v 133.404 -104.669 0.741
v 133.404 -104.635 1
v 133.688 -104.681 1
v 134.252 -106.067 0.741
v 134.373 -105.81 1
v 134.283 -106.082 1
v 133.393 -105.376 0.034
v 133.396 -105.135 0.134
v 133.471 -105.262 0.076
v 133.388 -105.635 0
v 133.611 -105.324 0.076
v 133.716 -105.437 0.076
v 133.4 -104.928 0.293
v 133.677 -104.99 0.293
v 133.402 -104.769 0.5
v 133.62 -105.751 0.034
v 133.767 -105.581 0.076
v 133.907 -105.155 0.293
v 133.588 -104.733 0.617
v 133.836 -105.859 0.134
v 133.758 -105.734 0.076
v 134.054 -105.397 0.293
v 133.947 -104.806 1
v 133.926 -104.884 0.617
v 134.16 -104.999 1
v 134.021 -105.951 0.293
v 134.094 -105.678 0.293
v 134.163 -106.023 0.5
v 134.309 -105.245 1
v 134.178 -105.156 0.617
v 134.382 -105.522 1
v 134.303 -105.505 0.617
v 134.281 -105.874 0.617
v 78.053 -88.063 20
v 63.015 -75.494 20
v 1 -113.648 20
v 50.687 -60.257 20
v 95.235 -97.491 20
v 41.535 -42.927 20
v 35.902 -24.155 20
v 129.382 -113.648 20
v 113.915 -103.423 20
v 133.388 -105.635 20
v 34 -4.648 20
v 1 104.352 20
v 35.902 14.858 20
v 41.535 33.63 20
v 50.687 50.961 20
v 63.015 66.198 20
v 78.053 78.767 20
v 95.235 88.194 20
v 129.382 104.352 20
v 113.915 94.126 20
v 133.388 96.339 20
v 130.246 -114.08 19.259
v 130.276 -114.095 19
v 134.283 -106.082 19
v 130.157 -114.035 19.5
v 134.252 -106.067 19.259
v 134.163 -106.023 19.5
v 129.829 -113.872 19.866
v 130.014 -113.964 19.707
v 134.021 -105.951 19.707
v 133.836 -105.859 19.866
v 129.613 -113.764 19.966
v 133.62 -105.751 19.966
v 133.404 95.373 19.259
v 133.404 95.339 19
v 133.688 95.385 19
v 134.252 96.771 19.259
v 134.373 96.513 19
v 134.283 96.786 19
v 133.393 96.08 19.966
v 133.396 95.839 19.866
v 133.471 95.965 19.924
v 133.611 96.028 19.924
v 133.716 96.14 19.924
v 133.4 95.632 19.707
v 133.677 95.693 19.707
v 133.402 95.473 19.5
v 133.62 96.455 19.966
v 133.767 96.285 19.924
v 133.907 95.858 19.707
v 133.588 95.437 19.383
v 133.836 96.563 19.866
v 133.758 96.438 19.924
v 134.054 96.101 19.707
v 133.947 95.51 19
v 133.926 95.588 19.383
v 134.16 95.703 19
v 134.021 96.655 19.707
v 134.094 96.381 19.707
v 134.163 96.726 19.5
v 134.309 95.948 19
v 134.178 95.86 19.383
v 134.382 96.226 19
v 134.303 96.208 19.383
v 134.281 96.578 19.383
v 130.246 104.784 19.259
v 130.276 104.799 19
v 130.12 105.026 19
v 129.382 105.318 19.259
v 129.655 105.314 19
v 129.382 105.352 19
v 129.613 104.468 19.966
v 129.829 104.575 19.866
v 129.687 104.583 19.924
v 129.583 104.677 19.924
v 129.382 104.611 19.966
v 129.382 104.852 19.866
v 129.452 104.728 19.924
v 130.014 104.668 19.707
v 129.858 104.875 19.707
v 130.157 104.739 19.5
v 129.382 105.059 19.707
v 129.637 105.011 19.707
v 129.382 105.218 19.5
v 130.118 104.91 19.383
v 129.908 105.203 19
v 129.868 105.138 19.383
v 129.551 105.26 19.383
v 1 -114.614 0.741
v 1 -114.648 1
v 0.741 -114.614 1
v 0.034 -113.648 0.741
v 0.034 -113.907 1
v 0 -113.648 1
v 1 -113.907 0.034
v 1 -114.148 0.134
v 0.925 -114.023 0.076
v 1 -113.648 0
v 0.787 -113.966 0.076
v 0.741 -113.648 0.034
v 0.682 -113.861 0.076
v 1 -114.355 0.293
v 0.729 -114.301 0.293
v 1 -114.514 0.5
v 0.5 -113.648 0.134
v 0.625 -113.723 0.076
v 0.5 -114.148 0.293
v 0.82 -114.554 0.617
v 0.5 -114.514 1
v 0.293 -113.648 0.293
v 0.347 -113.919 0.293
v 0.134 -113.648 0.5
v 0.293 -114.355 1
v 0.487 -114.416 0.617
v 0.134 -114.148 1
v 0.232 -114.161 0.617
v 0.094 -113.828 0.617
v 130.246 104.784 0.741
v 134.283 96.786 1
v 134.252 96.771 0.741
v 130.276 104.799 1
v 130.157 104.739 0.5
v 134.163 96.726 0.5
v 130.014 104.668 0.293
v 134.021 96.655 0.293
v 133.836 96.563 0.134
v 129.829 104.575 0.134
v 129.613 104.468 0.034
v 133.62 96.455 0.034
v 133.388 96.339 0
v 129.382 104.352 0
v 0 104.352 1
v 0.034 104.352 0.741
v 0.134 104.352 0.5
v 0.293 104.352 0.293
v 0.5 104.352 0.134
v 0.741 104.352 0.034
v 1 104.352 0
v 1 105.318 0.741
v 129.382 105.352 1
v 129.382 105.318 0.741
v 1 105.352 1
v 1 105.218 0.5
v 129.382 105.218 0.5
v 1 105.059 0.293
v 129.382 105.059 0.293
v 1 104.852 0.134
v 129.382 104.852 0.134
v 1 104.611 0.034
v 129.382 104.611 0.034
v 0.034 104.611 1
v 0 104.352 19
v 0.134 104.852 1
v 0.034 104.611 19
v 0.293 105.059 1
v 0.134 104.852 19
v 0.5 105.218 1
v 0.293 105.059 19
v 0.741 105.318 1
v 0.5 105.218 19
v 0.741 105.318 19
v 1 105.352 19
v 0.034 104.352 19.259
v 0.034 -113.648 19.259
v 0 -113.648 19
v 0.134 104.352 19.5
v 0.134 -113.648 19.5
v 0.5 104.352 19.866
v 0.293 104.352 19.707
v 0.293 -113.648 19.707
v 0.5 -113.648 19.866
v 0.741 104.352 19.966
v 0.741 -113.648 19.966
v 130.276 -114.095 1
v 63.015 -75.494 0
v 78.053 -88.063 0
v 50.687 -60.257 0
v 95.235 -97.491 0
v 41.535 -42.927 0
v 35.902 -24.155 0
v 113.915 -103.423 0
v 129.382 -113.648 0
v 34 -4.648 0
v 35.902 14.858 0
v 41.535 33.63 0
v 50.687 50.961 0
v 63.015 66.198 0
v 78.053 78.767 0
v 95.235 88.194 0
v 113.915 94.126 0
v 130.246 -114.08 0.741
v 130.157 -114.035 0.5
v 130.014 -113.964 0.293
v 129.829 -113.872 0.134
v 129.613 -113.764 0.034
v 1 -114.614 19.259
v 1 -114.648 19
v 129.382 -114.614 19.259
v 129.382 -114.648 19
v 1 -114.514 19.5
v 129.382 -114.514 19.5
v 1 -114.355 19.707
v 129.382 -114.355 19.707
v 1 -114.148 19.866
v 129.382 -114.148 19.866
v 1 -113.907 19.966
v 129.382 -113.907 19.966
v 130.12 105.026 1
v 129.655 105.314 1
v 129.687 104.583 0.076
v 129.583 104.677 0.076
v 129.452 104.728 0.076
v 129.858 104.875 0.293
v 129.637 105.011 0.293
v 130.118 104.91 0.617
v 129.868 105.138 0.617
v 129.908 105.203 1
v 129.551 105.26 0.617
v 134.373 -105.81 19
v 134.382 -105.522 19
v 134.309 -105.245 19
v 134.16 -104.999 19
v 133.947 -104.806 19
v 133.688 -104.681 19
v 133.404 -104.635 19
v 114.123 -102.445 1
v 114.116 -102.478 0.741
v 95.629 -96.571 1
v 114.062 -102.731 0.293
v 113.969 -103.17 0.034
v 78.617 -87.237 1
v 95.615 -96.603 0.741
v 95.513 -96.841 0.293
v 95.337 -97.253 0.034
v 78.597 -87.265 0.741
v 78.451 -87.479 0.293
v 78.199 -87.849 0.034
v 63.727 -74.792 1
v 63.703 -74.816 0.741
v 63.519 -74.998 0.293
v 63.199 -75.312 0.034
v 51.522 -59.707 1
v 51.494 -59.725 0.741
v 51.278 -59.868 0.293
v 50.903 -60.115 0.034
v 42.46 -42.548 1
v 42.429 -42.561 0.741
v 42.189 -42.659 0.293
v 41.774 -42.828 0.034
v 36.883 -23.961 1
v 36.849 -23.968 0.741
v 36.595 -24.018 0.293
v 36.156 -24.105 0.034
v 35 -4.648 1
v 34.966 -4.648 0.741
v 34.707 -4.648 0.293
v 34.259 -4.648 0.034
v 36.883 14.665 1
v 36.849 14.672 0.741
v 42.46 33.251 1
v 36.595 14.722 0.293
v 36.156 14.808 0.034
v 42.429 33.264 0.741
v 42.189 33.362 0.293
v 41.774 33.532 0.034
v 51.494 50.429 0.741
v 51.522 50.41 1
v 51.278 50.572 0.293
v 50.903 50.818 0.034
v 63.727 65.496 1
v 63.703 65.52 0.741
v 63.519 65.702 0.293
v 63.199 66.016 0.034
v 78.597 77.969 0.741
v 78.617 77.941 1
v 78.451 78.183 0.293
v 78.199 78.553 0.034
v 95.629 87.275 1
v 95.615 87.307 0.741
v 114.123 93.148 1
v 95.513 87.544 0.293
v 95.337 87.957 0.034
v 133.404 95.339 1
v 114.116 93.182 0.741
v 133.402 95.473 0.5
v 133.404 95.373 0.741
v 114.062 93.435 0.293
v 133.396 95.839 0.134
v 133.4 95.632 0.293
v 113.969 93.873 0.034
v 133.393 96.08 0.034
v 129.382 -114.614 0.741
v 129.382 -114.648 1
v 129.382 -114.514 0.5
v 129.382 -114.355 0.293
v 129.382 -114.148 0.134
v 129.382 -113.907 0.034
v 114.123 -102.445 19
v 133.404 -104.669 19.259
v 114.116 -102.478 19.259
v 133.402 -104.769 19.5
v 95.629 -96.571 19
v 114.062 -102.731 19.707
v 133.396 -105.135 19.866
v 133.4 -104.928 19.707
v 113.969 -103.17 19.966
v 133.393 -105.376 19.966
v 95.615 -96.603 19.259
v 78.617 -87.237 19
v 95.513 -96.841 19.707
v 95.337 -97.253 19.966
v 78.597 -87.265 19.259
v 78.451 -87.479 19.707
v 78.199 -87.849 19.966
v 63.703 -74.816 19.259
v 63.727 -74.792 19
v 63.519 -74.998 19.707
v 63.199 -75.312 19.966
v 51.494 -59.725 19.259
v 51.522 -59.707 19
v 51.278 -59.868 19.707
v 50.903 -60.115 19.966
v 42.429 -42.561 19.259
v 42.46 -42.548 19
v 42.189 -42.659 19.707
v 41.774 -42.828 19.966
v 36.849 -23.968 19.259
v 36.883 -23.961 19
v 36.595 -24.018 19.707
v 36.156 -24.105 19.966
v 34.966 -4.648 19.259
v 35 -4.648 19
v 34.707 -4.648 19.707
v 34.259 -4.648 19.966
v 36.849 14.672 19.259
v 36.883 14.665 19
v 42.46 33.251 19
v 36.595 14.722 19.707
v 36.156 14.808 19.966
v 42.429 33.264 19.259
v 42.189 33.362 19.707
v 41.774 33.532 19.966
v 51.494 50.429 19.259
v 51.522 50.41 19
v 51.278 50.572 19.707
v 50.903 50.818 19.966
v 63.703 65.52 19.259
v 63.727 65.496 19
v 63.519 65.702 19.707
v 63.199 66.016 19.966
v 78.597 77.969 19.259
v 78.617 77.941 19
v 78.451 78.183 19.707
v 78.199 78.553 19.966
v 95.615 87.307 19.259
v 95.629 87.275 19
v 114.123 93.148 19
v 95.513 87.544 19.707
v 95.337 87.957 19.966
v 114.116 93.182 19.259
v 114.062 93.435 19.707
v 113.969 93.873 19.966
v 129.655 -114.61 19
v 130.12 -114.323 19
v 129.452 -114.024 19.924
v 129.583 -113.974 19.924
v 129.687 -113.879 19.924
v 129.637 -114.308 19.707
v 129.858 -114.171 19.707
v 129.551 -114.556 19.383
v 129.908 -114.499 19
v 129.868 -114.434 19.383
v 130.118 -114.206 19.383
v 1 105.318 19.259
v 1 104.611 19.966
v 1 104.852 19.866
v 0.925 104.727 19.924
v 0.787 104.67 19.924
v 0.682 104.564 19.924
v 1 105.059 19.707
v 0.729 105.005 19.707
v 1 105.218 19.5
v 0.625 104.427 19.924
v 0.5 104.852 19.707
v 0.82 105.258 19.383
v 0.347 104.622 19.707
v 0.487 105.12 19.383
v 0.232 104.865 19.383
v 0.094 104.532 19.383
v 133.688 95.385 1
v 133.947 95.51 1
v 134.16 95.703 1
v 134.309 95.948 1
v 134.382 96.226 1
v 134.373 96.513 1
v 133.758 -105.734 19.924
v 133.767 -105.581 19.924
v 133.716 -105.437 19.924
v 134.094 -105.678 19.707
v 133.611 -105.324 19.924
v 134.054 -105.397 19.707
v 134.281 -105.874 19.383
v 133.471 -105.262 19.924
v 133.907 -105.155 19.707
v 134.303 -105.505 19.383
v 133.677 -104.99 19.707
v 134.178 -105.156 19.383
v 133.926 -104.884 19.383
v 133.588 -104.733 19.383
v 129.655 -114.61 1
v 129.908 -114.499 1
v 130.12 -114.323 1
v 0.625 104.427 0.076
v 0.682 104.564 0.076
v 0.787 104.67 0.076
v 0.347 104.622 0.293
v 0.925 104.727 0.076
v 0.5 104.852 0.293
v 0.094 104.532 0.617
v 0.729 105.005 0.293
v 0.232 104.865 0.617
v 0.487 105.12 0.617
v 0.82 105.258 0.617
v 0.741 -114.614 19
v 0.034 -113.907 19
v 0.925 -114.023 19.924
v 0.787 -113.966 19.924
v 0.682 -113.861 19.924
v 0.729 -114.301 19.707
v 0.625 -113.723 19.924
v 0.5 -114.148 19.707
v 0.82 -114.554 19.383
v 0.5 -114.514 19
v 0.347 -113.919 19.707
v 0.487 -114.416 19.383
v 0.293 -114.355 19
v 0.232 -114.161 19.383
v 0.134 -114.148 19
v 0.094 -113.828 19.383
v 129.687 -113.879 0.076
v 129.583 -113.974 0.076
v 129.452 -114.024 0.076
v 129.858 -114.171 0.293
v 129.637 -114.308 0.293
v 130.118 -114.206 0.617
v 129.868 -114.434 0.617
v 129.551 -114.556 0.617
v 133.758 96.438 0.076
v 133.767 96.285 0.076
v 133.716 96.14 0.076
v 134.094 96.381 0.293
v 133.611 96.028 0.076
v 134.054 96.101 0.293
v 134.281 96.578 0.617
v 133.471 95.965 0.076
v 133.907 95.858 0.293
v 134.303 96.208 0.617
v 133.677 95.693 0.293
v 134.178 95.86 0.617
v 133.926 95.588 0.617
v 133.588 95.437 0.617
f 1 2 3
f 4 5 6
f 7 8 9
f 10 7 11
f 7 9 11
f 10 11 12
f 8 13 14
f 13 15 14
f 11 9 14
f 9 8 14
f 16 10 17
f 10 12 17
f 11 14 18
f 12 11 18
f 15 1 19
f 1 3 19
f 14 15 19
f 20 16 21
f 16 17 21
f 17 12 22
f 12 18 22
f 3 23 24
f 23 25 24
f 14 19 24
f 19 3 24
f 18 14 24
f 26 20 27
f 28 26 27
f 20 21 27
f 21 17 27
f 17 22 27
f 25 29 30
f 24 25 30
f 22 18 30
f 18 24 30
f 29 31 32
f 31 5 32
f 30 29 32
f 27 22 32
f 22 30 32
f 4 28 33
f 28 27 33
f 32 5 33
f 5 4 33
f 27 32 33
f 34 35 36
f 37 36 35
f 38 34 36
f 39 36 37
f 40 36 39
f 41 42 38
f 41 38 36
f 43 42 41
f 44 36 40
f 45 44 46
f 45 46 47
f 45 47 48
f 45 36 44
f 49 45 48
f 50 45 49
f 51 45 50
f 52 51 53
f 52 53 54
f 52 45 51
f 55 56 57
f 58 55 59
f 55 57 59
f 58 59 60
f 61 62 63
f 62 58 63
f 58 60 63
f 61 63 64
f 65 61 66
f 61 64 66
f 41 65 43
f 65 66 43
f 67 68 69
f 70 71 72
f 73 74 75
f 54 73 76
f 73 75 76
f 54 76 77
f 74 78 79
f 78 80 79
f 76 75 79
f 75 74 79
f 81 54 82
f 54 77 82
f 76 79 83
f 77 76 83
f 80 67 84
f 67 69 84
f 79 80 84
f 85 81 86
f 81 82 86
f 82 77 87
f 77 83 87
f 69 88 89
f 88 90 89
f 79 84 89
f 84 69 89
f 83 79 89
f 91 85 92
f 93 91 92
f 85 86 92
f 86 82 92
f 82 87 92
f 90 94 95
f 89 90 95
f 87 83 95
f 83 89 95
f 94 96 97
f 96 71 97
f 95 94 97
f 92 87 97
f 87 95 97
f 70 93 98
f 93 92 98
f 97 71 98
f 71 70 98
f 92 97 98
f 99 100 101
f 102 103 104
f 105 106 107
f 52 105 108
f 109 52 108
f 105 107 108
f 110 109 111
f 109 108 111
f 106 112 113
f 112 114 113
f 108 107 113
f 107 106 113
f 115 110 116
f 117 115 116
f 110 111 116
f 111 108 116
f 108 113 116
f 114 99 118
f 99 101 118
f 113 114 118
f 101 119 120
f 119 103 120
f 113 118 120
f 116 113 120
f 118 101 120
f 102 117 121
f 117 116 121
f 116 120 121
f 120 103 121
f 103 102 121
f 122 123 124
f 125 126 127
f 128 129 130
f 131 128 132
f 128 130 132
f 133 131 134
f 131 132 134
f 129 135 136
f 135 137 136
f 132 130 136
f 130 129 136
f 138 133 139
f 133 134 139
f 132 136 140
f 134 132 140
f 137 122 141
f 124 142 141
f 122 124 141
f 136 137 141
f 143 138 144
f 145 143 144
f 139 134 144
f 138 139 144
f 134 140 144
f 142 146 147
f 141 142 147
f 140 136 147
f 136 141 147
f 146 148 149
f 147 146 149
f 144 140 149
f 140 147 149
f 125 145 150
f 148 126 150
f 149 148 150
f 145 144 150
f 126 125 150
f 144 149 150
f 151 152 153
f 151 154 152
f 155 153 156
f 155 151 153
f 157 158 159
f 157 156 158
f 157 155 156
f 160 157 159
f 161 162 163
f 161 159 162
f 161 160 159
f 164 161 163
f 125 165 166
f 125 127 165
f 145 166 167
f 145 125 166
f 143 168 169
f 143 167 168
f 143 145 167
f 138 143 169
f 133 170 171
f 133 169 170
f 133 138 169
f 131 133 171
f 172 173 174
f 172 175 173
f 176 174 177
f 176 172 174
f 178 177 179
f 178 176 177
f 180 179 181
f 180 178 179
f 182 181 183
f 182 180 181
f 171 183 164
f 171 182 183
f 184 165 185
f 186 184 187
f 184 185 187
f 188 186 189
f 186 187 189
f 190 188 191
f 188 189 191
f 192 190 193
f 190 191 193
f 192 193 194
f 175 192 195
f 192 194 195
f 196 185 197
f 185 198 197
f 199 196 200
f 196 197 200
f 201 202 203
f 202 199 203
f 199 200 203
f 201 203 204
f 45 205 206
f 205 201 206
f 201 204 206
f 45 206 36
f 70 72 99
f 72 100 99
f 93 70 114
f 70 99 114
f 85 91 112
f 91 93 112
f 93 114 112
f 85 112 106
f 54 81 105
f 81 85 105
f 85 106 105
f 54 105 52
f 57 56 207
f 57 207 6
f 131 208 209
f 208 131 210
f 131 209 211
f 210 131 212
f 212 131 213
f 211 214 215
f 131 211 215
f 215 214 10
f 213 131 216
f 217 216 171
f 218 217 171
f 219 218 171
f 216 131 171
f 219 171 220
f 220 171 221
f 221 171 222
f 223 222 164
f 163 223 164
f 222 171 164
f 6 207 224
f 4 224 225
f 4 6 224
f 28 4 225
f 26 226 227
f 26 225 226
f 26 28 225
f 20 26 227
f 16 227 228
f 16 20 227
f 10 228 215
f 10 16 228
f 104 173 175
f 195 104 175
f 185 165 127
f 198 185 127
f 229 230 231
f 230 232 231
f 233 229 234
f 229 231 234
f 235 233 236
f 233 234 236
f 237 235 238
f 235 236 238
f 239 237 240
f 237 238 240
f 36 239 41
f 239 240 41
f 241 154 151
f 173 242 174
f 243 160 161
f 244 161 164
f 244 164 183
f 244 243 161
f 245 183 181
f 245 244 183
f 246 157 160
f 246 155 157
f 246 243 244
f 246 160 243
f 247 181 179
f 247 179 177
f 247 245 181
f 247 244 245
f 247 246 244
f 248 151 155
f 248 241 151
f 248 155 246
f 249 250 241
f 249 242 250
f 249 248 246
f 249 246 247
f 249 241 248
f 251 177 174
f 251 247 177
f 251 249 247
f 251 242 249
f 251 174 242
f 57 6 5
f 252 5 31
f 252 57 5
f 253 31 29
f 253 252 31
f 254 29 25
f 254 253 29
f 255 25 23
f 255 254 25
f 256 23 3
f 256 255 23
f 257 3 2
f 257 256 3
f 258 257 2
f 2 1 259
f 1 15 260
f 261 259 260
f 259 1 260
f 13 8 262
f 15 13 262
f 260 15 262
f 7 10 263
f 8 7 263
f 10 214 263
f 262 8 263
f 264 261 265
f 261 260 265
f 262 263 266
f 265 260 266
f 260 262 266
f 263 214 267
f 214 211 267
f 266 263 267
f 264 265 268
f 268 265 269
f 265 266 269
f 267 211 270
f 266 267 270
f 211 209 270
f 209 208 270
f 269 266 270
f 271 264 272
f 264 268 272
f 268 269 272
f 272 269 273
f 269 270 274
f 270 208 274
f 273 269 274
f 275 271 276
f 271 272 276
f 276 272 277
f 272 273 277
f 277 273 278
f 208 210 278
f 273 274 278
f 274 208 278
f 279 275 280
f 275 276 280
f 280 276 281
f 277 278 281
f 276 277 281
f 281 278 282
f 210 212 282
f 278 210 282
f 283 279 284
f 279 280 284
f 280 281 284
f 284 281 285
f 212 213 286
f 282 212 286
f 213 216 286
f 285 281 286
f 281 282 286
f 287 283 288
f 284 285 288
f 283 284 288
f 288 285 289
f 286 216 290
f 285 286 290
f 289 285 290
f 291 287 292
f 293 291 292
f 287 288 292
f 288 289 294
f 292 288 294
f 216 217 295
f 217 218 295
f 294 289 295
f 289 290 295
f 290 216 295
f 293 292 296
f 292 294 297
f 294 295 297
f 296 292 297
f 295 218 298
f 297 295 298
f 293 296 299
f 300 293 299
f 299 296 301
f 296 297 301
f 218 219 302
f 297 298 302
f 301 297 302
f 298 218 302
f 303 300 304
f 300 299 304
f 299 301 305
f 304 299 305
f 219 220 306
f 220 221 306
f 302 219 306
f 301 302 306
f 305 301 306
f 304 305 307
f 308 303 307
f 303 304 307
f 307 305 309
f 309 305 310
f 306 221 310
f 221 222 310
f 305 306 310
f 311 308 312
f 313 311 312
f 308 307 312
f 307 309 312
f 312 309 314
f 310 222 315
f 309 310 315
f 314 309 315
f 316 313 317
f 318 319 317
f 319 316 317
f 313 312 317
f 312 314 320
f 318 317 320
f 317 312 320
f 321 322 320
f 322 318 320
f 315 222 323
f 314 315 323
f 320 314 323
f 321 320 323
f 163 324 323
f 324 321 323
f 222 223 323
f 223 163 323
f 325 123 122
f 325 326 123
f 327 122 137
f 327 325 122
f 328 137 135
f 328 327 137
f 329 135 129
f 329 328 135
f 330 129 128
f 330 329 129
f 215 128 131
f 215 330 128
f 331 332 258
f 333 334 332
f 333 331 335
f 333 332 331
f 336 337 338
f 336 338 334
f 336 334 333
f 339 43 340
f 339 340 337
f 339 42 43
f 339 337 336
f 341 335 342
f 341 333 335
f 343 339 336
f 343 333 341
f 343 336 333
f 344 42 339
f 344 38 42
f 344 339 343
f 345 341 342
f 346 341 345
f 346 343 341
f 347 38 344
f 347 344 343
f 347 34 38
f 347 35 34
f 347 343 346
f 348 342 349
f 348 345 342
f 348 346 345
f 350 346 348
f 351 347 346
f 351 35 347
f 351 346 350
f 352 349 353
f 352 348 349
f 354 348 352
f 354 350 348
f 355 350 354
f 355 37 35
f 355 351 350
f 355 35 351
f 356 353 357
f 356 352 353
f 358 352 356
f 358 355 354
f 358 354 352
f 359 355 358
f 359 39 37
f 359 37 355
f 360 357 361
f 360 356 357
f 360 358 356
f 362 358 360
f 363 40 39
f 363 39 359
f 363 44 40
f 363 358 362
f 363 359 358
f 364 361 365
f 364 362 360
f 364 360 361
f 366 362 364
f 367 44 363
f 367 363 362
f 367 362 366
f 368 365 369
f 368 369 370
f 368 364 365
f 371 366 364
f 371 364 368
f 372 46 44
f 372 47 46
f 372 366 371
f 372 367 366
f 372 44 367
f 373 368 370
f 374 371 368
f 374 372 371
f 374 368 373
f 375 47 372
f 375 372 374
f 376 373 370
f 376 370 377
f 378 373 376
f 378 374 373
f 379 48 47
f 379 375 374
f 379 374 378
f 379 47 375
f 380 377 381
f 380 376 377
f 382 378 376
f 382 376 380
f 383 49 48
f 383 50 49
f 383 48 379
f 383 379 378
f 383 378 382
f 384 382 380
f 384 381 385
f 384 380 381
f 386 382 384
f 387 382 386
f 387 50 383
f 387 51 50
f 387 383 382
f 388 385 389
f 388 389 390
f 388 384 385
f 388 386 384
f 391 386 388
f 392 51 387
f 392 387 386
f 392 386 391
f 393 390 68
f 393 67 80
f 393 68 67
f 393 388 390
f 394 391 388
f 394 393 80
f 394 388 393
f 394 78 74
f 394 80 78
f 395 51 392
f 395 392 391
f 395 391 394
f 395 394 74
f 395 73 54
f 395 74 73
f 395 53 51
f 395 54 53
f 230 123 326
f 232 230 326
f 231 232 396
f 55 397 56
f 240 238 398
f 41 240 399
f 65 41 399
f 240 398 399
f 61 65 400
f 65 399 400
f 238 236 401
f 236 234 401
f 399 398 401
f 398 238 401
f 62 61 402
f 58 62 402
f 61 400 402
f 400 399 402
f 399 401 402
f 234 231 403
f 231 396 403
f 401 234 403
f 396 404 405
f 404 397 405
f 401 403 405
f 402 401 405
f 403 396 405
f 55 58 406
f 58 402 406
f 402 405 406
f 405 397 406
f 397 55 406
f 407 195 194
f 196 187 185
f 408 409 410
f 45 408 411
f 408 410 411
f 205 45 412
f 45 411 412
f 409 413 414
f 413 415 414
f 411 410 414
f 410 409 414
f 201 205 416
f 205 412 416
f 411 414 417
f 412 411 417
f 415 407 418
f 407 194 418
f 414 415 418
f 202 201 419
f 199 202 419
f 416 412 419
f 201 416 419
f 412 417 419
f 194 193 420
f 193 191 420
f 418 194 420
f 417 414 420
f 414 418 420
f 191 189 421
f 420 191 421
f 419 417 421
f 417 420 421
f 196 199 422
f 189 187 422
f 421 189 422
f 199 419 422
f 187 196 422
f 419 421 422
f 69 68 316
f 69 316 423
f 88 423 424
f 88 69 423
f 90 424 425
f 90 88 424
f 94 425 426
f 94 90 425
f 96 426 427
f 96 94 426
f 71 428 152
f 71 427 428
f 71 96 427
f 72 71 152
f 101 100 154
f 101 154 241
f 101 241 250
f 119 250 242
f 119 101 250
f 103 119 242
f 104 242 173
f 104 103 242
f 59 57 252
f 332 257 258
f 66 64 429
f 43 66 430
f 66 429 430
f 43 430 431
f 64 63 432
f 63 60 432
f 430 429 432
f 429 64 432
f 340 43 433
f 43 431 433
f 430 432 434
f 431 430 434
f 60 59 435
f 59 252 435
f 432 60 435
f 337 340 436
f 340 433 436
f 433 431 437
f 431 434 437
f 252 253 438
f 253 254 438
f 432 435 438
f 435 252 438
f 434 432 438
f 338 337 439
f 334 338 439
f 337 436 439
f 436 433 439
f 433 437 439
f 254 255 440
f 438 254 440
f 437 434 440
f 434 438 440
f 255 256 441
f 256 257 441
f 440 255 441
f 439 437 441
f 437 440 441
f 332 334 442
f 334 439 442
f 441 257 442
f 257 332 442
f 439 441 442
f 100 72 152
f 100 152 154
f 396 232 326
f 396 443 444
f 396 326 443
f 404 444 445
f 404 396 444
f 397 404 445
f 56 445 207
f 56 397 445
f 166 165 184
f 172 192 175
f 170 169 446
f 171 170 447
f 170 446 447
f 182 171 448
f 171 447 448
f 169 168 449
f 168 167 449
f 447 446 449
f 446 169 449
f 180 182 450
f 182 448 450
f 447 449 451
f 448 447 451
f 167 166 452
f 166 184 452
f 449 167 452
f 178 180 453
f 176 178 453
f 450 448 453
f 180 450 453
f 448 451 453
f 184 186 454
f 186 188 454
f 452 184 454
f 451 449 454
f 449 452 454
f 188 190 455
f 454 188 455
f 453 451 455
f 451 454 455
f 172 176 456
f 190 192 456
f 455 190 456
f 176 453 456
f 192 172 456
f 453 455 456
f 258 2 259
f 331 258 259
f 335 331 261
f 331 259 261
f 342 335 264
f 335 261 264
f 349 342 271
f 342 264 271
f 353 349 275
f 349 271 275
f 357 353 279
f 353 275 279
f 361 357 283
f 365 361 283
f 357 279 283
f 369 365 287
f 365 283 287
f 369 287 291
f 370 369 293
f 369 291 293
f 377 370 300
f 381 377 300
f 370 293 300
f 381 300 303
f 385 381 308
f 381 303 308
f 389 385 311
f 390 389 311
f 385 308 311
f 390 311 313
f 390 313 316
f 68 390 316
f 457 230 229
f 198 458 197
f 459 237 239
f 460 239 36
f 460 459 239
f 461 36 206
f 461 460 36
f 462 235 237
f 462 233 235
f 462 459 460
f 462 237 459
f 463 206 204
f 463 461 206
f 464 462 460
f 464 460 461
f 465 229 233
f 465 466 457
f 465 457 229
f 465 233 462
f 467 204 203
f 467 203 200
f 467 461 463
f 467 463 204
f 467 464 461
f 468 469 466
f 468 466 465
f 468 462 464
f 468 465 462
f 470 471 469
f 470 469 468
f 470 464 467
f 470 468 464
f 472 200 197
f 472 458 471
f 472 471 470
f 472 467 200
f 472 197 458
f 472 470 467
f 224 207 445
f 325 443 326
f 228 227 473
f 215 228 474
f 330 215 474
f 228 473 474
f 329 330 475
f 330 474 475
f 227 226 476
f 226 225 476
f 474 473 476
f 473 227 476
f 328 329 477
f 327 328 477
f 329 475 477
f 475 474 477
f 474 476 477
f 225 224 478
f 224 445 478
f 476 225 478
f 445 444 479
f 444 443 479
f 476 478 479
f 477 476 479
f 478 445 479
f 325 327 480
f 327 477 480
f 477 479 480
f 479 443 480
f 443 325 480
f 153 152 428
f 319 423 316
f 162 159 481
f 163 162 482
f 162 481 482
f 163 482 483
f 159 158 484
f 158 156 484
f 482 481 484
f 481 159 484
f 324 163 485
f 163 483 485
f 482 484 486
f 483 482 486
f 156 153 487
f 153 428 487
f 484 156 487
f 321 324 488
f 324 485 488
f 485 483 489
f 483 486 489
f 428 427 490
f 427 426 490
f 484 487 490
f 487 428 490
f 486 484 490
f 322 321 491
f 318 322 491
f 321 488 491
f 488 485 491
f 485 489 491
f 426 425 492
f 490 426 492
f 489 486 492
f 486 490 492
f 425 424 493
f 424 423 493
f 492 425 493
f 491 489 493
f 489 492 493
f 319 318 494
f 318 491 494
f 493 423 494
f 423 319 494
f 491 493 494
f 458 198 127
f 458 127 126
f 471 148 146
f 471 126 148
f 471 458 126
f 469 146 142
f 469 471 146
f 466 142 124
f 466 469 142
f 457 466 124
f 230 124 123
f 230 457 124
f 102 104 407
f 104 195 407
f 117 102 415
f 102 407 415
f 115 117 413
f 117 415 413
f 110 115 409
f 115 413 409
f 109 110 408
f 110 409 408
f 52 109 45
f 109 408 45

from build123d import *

# Parameters (mm, degrees)
BOSS_EXTRUDE1_DEPTH = 20
FILLET1_R           = 1


with BuildPart() as part:
    # Sketch2 → Boss-Extrude1 (new body)
    with BuildSketch(Plane.XY):
        with BuildLine():
            Line((0, 105.351887556), (0, -114.648112444))
            Line((0, -114.648112444), (130, -114.648112444))
            Line((130, -114.648112444), (135, -104.648112444))
            ThreePointArc((135, -104.648112444), (35, -4.648112444), (135, 95.351887556))
            Line((135, 95.351887556), (130, 105.351887556))
            Line((130, 105.351887556), (0, 105.351887556))
        make_face()
    extrude(amount=BOSS_EXTRUDE1_DEPTH)

    # Fillet1
    fillet1_edges = [part.edges().sort_by_distance(p)[0] for p in [
        (130, 105.351887556, 10),
        (135, 95.351887556, 10),
        (135, -104.648112444, 10),
        (130, -114.648112444, 10),
        (0, -114.648112444, 10),
        (0, 105.351887556, 10),
        (65, -114.648112444, 20),
        (132.5, -109.648112444, 20),
        (35, -4.648112444, 20),
        (132.5, 100.351887556, 20),
        (65, 105.351887556, 20),
        (132.5, 100.351887556, 0),
        (35, -4.648112444, 0),
        (132.5, -109.648112444, 0),
        (65, -114.648112444, 0),
        (0, -4.648112444, 0),
        (65, 105.351887556, 0),
        (0, -4.648112444, 20),
    ]]
    fillet(fillet1_edges, radius=FILLET1_R)


solid = part.part
